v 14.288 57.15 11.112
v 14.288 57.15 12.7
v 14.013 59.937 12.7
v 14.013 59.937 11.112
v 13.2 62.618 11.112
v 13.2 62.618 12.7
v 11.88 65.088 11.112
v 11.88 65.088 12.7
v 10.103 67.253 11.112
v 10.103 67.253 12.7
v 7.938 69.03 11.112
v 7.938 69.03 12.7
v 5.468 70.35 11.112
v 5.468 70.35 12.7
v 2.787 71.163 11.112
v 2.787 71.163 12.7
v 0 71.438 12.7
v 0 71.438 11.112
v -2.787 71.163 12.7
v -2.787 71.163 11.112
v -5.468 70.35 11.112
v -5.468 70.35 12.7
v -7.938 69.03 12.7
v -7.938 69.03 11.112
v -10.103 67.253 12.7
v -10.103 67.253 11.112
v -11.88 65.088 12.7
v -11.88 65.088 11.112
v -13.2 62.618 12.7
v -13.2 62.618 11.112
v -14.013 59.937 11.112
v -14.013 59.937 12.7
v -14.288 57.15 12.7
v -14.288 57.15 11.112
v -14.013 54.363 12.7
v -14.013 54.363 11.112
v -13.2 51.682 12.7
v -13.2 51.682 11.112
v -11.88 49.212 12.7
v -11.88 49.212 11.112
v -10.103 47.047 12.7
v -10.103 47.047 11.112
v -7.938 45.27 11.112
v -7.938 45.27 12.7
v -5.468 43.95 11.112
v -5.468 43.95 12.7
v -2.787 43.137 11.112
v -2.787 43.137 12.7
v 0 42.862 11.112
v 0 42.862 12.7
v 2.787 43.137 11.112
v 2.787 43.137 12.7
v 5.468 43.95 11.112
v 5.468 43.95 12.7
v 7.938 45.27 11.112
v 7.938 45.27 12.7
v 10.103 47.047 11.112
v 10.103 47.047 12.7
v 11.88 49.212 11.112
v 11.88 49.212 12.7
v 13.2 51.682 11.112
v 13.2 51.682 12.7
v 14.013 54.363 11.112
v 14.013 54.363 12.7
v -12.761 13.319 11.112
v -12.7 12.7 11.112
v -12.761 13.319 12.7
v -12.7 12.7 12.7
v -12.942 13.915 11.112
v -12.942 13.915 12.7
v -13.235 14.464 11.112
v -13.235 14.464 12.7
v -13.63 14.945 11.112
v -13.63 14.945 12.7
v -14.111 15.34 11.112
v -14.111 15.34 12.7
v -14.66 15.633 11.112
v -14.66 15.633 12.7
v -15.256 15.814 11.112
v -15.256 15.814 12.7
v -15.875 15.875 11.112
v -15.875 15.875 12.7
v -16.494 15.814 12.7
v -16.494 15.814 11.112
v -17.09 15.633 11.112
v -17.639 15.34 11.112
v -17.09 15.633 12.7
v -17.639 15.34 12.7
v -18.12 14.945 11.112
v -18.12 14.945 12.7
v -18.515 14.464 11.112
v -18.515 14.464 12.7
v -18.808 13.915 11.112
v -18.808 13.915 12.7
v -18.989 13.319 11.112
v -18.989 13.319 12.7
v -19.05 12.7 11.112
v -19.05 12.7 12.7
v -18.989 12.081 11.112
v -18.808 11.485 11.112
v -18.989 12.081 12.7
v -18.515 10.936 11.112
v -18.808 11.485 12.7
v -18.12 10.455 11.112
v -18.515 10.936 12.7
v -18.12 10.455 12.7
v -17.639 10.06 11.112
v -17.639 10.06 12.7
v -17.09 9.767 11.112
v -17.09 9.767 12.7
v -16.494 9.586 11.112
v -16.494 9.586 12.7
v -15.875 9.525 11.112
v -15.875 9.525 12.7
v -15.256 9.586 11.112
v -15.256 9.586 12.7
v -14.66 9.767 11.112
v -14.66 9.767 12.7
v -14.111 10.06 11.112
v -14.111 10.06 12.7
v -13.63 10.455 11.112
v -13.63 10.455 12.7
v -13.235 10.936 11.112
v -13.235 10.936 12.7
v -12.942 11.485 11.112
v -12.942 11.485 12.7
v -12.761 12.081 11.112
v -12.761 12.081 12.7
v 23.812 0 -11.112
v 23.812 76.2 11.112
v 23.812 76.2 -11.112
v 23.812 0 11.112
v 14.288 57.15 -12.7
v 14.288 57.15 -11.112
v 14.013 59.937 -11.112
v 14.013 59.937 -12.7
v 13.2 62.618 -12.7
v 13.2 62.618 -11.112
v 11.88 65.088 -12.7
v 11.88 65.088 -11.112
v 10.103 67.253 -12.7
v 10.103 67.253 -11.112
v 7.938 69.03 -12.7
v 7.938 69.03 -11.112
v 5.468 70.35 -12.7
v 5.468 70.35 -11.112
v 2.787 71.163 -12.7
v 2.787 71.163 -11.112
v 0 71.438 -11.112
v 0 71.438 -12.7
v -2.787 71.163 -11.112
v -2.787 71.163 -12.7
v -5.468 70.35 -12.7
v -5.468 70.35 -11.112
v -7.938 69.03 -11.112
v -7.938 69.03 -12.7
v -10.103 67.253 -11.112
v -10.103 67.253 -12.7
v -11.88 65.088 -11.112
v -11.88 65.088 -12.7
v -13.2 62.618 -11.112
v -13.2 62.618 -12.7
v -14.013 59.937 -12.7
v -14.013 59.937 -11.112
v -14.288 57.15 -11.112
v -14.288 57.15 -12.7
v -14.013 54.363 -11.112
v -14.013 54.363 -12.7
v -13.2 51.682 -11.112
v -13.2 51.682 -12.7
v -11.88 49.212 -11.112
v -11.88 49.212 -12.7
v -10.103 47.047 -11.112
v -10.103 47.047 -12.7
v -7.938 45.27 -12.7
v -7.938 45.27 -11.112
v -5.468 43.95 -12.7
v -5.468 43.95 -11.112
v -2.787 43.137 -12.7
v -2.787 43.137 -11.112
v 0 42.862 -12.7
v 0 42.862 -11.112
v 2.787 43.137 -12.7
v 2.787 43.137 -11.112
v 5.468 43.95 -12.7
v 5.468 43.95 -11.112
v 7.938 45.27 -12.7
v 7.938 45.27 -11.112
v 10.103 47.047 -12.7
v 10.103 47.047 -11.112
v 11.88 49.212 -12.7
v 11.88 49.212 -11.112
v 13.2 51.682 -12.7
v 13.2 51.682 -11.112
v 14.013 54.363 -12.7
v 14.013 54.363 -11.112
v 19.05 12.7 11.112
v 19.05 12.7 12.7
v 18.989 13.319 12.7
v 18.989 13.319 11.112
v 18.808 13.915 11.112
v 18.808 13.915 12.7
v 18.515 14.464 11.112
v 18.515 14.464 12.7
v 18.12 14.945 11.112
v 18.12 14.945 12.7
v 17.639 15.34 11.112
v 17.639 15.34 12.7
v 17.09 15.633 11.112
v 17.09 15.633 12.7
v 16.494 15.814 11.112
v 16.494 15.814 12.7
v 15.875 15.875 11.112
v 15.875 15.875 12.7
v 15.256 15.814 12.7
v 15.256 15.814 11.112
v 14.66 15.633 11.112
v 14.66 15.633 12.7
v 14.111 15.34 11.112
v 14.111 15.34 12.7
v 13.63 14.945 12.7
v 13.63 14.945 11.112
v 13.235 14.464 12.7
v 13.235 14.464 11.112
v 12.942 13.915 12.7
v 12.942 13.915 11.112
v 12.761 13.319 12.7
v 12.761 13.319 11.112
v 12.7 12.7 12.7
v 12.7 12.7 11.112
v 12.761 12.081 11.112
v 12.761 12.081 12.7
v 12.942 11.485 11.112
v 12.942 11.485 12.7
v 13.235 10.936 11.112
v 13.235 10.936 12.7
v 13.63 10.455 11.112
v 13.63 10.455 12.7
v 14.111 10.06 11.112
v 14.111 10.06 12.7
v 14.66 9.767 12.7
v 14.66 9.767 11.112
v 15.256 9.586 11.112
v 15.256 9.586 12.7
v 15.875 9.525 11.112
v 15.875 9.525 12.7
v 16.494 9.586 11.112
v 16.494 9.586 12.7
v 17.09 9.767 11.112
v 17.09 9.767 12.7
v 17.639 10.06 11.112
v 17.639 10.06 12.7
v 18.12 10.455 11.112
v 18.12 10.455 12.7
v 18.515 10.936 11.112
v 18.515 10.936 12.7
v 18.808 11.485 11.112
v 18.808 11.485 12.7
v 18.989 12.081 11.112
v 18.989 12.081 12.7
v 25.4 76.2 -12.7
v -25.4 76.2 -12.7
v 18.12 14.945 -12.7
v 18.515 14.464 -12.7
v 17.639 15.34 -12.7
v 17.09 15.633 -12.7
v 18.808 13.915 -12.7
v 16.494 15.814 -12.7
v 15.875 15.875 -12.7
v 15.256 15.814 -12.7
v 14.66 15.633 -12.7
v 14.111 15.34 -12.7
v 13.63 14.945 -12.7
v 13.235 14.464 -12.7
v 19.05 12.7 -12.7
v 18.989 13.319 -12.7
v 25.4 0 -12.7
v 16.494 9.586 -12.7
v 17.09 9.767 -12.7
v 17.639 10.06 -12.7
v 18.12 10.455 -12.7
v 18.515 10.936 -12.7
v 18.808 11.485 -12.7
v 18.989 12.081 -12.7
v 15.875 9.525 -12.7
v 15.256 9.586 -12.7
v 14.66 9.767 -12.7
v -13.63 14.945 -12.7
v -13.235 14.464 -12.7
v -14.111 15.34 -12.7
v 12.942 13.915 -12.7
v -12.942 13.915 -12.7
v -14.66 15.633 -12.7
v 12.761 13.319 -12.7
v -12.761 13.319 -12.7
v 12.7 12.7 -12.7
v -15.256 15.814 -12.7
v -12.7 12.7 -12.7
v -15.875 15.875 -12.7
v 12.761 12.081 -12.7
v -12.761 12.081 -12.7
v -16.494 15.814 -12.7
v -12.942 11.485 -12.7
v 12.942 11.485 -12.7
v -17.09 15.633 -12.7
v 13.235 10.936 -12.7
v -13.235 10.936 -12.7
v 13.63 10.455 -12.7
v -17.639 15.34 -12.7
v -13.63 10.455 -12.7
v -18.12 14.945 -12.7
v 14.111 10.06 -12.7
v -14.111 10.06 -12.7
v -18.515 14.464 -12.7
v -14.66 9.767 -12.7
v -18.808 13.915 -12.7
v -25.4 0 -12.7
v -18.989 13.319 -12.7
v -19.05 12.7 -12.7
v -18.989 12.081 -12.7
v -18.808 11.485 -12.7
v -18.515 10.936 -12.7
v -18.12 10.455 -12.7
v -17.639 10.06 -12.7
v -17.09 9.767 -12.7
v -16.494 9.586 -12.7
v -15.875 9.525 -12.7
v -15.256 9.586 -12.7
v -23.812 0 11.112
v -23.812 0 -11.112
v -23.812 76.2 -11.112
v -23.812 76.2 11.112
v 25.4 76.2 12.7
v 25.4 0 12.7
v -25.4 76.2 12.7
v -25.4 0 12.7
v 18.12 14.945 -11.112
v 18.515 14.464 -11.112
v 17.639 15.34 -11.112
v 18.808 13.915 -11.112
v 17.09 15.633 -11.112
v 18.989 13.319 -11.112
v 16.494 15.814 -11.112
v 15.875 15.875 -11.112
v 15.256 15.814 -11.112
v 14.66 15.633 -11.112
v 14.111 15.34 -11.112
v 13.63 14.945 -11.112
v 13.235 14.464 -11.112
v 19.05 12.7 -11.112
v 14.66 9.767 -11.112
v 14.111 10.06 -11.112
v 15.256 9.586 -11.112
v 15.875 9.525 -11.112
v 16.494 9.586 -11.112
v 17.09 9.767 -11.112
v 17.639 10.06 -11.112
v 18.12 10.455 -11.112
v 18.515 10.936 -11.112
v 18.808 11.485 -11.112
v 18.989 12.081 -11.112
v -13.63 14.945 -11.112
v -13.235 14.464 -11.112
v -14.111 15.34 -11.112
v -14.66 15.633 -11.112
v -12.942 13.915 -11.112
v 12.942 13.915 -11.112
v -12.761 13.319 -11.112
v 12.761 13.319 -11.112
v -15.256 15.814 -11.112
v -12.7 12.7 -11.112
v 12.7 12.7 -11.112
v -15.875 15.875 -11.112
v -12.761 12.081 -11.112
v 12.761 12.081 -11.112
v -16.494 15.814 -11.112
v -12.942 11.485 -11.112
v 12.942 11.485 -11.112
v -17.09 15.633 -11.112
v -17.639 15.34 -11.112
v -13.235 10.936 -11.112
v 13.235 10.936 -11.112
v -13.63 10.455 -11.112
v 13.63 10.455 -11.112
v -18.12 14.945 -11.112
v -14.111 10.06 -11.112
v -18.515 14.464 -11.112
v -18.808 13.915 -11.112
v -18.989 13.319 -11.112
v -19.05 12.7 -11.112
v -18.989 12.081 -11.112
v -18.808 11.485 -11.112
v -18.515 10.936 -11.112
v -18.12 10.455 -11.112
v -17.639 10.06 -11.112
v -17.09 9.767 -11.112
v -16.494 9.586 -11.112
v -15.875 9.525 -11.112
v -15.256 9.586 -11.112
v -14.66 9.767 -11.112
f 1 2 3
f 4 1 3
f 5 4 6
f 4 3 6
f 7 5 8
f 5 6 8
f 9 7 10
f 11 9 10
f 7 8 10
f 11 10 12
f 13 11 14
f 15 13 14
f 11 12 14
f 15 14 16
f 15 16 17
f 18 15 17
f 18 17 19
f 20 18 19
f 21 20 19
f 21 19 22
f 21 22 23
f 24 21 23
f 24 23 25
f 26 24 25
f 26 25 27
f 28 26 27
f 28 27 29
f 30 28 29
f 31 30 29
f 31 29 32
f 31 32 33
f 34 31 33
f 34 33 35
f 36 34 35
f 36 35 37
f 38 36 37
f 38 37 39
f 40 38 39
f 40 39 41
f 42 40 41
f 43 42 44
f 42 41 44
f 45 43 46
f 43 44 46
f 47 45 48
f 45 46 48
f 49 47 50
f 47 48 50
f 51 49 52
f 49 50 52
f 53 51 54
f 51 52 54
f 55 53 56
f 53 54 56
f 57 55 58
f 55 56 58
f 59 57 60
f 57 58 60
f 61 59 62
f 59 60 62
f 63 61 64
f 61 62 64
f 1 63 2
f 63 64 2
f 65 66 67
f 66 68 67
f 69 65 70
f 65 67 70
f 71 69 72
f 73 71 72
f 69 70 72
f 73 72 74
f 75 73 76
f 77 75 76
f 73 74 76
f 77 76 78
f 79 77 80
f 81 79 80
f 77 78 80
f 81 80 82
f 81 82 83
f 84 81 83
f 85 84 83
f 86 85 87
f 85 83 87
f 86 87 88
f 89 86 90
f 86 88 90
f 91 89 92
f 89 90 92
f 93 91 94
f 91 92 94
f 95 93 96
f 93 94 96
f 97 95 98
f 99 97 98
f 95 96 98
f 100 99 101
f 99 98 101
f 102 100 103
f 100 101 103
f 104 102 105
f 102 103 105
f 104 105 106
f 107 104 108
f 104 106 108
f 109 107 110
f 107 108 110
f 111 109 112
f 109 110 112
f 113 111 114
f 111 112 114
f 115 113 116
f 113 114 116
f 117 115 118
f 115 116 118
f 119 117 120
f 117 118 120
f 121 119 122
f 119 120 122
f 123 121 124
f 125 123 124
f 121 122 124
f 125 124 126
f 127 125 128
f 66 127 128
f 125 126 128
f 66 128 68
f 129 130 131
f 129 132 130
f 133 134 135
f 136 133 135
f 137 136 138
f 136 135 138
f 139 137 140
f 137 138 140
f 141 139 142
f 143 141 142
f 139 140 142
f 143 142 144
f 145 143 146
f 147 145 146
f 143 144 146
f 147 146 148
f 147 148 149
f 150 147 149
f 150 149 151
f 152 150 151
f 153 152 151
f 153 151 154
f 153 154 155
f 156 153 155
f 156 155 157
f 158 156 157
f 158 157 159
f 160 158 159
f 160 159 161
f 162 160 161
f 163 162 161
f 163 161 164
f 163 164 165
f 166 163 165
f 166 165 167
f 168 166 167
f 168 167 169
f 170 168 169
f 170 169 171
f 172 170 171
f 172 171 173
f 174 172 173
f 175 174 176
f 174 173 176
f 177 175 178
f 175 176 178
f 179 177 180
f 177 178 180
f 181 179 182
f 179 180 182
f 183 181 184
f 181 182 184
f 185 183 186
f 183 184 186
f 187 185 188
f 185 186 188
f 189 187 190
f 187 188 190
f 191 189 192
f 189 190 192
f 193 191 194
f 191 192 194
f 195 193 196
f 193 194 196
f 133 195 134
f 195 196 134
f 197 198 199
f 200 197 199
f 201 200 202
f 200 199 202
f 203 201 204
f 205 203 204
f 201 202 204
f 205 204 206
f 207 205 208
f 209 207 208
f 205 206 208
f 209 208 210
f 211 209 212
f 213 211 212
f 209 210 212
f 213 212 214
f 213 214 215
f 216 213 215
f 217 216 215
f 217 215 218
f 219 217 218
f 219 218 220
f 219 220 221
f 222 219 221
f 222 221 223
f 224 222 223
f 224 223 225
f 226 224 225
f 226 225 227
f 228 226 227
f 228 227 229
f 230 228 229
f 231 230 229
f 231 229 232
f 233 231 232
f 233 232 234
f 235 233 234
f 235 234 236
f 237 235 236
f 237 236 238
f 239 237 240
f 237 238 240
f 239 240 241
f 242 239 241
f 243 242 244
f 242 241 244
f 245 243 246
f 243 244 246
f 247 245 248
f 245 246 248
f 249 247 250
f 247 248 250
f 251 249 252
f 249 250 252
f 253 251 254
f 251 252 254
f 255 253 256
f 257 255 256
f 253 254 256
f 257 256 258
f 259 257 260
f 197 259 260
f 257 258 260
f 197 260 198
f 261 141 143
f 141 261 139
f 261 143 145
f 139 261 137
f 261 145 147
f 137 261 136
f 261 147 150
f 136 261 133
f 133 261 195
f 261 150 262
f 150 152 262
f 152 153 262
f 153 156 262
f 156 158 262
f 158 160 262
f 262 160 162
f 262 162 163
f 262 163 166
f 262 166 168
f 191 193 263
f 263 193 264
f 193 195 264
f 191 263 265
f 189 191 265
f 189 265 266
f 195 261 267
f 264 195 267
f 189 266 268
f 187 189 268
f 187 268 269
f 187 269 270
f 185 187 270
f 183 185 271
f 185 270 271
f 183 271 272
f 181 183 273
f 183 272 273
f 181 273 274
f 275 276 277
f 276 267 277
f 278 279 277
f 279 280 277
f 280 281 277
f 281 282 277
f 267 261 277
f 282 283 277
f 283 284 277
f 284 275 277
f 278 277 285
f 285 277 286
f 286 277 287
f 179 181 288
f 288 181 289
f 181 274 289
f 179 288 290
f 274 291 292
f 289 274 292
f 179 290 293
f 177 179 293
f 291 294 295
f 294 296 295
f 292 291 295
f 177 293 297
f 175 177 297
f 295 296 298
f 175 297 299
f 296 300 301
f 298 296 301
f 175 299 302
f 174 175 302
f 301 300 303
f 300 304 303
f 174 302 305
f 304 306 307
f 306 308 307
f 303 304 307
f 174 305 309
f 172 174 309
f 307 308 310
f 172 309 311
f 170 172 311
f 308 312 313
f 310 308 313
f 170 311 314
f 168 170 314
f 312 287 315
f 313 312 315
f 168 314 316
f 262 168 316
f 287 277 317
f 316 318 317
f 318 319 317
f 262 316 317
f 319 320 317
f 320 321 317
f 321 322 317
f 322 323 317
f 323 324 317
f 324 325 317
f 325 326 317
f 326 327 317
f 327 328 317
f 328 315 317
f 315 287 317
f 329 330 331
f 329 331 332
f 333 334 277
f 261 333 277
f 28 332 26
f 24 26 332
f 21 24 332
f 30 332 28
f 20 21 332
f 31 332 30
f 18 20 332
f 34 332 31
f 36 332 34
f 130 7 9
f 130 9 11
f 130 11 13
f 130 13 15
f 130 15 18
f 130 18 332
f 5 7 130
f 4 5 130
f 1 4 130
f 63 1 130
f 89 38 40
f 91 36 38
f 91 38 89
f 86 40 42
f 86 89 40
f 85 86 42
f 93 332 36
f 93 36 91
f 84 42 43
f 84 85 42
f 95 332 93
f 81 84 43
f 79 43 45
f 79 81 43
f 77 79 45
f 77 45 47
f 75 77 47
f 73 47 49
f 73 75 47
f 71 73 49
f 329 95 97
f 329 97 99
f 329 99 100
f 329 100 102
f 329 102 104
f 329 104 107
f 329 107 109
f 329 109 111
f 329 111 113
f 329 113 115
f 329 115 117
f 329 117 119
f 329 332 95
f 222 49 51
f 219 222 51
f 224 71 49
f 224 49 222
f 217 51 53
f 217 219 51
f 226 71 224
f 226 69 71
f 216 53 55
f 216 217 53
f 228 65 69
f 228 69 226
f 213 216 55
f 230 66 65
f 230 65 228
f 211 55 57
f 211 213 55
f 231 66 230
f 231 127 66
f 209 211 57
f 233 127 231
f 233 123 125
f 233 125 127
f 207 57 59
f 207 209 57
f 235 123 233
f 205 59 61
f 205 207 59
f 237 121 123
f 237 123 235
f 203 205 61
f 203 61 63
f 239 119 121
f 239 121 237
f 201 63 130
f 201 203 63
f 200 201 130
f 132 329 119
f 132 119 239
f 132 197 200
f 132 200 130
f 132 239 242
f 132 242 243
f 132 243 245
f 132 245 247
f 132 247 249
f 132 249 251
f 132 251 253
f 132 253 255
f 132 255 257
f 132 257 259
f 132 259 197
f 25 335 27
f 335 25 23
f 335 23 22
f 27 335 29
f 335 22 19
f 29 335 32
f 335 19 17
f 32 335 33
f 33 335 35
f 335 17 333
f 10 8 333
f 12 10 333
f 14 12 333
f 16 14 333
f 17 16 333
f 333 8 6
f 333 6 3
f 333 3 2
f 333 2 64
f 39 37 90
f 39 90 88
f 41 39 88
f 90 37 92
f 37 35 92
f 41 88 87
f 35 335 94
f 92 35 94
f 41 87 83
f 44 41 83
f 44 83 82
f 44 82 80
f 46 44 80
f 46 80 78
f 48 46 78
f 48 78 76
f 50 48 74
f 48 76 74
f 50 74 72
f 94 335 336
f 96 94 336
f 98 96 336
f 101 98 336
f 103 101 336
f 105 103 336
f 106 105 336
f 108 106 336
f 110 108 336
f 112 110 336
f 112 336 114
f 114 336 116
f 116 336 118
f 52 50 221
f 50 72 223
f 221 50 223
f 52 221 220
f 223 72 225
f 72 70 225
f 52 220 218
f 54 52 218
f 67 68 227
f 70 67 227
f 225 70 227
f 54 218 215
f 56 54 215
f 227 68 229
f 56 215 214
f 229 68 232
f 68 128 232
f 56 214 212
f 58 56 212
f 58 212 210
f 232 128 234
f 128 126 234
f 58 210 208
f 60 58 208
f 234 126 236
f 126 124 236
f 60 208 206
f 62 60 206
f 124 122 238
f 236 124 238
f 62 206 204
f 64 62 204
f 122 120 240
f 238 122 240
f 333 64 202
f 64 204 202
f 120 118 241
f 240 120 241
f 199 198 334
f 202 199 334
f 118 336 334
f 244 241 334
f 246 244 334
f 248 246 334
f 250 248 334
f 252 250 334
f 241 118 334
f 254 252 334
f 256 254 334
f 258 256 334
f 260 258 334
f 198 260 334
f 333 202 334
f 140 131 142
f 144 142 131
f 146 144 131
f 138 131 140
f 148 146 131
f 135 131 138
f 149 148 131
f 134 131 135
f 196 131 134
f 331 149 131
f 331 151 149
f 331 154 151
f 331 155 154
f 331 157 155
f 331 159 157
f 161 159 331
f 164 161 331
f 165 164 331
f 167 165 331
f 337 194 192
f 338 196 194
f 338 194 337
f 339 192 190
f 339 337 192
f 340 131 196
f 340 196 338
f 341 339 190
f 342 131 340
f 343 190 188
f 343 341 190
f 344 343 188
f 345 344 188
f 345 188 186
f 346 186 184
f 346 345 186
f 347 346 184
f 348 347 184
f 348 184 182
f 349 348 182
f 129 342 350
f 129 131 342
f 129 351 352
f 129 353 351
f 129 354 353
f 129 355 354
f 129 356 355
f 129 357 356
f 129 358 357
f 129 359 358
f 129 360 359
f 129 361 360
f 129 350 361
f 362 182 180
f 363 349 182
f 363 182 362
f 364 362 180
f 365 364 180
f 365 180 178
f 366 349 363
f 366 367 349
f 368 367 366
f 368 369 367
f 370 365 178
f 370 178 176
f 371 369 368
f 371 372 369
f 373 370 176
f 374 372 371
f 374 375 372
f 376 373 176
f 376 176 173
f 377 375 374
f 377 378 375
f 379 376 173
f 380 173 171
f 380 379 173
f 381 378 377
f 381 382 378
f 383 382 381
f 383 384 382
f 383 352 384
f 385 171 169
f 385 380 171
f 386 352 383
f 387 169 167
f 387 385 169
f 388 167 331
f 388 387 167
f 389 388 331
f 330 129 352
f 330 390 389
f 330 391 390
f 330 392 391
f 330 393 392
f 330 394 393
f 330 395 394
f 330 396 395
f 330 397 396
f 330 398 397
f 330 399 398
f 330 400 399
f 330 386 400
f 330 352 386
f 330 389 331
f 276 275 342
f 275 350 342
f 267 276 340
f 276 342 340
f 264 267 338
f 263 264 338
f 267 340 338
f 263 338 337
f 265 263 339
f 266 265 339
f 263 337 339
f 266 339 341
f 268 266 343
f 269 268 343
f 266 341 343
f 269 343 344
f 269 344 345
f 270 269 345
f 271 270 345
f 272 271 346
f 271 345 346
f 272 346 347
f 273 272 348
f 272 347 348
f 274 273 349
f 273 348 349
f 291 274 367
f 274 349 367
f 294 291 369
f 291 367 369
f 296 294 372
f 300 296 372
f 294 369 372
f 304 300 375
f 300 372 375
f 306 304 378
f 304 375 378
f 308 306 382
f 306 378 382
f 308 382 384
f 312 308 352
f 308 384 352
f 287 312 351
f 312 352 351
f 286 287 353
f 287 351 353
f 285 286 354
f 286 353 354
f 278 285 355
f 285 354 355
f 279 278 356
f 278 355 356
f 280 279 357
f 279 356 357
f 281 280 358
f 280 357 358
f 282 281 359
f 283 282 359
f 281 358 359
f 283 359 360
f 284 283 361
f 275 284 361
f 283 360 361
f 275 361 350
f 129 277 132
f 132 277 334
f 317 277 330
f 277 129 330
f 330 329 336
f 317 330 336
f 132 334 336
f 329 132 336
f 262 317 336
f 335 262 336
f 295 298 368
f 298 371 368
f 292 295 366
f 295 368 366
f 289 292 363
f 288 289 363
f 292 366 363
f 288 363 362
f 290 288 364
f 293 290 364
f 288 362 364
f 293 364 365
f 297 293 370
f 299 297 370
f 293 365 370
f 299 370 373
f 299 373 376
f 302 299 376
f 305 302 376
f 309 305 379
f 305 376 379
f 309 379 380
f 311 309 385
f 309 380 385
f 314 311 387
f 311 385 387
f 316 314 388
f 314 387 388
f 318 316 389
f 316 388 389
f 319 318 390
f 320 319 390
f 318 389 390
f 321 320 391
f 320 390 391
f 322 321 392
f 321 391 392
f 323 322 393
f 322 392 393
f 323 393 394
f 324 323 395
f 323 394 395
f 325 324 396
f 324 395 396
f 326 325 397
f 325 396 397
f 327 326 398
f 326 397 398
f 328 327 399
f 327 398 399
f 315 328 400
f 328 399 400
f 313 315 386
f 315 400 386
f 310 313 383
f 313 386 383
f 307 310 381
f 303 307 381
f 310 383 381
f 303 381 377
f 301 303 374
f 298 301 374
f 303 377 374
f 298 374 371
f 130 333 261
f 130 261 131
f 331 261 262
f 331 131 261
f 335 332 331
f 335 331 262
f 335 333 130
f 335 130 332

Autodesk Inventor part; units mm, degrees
ref_plane "YZ Plane" through (0, 0, 0) normal (1, 0, 0) x (0, 1, 0)
ref_plane "XZ Plane" through (0, 0, 0) normal (0, 1, 0) x (-1, 0, 0)
ref_plane "XY Plane" through (0, 0, 0) normal (0, 0, 1) x (1, 0, 0)
sketch "Sketch1" plane through (0, 0, 0) normal (0, 1, 0) x (-1, 0, 0)
  line L0 (-25.4, -12.7) -> (25.4, -12.7)
  line L1 (25.4, -12.7) -> (25.4, 12.7)
  line L2 (25.4, 12.7) -> (-25.4, 12.7)
  line L3 (-25.4, 12.7) -> (-25.4, -12.7)
  line L4 (-25.4, -12.7) -> (25.4, 12.7) construction
  line L5 (25.4, -12.7) -> (-25.4, 12.7) construction
  line L6 (-23.8125, -11.9062) -> (23.8125, 11.9062) construction
  line L7 (23.8125, -11.9062) -> (-23.8125, 11.9062) construction
  line L8 (23.8125, 11.1125) -> (-23.8125, 11.1125)
  line L9 (-23.8125, 11.1125) -> (-23.8125, -11.1125)
  line L10 (-23.8125, -11.1125) -> (23.8125, -11.1125)
  line L11 (23.8125, -11.1125) -> (23.8125, 11.1125)
  point P0 (0, 0)
  dimension "d1" = 25.4
  dimension "d4" = 50.8
  dimension "d7" = 1.5875
  dimension "d8" = 1.5875
  dimension "d9" = 1.5875
  dimension "d10" = 1.5875
extrude "Extrusion2" add sketch "Sketch1" along normal blind 76.2
sketch "Sketch2" plane through (-25.4, 0, 12.7) normal (0, 0, 1) x (1, 0, 0)
  circle A0 centre (25.4, 57.15) radius 14.2875
  circle A1 centre (9.525, 12.7) radius 3.175
  circle A2 centre (41.275, 12.7) radius 3.175
  line L0 (0, 0) -> (0, 76.2) projected
  line L1 (0, 0) -> (50.8, 0) projected
  line L2 (0, 76.2) -> (50.8, 76.2) projected
  point P0 (25.4, 0)
  dimension "d13" = 28.575
  dimension "d14" = 31.75
  dimension "d15" = 9.525
  dimension "d16" = 12.7
  dimension "d17" = 12.7
  dimension "d18" = 19.05
  dimension "d19" = 6.35
  dimension "d20" = 6.35
extrude "Extrusion3" cut sketch "Sketch2" against normal blind 76.2
equation "\"d8\" = d7"
equation "\"d9\" = d7"
equation "\"d10\" = d7"
properties part number "1x2 hexshaft mount"
